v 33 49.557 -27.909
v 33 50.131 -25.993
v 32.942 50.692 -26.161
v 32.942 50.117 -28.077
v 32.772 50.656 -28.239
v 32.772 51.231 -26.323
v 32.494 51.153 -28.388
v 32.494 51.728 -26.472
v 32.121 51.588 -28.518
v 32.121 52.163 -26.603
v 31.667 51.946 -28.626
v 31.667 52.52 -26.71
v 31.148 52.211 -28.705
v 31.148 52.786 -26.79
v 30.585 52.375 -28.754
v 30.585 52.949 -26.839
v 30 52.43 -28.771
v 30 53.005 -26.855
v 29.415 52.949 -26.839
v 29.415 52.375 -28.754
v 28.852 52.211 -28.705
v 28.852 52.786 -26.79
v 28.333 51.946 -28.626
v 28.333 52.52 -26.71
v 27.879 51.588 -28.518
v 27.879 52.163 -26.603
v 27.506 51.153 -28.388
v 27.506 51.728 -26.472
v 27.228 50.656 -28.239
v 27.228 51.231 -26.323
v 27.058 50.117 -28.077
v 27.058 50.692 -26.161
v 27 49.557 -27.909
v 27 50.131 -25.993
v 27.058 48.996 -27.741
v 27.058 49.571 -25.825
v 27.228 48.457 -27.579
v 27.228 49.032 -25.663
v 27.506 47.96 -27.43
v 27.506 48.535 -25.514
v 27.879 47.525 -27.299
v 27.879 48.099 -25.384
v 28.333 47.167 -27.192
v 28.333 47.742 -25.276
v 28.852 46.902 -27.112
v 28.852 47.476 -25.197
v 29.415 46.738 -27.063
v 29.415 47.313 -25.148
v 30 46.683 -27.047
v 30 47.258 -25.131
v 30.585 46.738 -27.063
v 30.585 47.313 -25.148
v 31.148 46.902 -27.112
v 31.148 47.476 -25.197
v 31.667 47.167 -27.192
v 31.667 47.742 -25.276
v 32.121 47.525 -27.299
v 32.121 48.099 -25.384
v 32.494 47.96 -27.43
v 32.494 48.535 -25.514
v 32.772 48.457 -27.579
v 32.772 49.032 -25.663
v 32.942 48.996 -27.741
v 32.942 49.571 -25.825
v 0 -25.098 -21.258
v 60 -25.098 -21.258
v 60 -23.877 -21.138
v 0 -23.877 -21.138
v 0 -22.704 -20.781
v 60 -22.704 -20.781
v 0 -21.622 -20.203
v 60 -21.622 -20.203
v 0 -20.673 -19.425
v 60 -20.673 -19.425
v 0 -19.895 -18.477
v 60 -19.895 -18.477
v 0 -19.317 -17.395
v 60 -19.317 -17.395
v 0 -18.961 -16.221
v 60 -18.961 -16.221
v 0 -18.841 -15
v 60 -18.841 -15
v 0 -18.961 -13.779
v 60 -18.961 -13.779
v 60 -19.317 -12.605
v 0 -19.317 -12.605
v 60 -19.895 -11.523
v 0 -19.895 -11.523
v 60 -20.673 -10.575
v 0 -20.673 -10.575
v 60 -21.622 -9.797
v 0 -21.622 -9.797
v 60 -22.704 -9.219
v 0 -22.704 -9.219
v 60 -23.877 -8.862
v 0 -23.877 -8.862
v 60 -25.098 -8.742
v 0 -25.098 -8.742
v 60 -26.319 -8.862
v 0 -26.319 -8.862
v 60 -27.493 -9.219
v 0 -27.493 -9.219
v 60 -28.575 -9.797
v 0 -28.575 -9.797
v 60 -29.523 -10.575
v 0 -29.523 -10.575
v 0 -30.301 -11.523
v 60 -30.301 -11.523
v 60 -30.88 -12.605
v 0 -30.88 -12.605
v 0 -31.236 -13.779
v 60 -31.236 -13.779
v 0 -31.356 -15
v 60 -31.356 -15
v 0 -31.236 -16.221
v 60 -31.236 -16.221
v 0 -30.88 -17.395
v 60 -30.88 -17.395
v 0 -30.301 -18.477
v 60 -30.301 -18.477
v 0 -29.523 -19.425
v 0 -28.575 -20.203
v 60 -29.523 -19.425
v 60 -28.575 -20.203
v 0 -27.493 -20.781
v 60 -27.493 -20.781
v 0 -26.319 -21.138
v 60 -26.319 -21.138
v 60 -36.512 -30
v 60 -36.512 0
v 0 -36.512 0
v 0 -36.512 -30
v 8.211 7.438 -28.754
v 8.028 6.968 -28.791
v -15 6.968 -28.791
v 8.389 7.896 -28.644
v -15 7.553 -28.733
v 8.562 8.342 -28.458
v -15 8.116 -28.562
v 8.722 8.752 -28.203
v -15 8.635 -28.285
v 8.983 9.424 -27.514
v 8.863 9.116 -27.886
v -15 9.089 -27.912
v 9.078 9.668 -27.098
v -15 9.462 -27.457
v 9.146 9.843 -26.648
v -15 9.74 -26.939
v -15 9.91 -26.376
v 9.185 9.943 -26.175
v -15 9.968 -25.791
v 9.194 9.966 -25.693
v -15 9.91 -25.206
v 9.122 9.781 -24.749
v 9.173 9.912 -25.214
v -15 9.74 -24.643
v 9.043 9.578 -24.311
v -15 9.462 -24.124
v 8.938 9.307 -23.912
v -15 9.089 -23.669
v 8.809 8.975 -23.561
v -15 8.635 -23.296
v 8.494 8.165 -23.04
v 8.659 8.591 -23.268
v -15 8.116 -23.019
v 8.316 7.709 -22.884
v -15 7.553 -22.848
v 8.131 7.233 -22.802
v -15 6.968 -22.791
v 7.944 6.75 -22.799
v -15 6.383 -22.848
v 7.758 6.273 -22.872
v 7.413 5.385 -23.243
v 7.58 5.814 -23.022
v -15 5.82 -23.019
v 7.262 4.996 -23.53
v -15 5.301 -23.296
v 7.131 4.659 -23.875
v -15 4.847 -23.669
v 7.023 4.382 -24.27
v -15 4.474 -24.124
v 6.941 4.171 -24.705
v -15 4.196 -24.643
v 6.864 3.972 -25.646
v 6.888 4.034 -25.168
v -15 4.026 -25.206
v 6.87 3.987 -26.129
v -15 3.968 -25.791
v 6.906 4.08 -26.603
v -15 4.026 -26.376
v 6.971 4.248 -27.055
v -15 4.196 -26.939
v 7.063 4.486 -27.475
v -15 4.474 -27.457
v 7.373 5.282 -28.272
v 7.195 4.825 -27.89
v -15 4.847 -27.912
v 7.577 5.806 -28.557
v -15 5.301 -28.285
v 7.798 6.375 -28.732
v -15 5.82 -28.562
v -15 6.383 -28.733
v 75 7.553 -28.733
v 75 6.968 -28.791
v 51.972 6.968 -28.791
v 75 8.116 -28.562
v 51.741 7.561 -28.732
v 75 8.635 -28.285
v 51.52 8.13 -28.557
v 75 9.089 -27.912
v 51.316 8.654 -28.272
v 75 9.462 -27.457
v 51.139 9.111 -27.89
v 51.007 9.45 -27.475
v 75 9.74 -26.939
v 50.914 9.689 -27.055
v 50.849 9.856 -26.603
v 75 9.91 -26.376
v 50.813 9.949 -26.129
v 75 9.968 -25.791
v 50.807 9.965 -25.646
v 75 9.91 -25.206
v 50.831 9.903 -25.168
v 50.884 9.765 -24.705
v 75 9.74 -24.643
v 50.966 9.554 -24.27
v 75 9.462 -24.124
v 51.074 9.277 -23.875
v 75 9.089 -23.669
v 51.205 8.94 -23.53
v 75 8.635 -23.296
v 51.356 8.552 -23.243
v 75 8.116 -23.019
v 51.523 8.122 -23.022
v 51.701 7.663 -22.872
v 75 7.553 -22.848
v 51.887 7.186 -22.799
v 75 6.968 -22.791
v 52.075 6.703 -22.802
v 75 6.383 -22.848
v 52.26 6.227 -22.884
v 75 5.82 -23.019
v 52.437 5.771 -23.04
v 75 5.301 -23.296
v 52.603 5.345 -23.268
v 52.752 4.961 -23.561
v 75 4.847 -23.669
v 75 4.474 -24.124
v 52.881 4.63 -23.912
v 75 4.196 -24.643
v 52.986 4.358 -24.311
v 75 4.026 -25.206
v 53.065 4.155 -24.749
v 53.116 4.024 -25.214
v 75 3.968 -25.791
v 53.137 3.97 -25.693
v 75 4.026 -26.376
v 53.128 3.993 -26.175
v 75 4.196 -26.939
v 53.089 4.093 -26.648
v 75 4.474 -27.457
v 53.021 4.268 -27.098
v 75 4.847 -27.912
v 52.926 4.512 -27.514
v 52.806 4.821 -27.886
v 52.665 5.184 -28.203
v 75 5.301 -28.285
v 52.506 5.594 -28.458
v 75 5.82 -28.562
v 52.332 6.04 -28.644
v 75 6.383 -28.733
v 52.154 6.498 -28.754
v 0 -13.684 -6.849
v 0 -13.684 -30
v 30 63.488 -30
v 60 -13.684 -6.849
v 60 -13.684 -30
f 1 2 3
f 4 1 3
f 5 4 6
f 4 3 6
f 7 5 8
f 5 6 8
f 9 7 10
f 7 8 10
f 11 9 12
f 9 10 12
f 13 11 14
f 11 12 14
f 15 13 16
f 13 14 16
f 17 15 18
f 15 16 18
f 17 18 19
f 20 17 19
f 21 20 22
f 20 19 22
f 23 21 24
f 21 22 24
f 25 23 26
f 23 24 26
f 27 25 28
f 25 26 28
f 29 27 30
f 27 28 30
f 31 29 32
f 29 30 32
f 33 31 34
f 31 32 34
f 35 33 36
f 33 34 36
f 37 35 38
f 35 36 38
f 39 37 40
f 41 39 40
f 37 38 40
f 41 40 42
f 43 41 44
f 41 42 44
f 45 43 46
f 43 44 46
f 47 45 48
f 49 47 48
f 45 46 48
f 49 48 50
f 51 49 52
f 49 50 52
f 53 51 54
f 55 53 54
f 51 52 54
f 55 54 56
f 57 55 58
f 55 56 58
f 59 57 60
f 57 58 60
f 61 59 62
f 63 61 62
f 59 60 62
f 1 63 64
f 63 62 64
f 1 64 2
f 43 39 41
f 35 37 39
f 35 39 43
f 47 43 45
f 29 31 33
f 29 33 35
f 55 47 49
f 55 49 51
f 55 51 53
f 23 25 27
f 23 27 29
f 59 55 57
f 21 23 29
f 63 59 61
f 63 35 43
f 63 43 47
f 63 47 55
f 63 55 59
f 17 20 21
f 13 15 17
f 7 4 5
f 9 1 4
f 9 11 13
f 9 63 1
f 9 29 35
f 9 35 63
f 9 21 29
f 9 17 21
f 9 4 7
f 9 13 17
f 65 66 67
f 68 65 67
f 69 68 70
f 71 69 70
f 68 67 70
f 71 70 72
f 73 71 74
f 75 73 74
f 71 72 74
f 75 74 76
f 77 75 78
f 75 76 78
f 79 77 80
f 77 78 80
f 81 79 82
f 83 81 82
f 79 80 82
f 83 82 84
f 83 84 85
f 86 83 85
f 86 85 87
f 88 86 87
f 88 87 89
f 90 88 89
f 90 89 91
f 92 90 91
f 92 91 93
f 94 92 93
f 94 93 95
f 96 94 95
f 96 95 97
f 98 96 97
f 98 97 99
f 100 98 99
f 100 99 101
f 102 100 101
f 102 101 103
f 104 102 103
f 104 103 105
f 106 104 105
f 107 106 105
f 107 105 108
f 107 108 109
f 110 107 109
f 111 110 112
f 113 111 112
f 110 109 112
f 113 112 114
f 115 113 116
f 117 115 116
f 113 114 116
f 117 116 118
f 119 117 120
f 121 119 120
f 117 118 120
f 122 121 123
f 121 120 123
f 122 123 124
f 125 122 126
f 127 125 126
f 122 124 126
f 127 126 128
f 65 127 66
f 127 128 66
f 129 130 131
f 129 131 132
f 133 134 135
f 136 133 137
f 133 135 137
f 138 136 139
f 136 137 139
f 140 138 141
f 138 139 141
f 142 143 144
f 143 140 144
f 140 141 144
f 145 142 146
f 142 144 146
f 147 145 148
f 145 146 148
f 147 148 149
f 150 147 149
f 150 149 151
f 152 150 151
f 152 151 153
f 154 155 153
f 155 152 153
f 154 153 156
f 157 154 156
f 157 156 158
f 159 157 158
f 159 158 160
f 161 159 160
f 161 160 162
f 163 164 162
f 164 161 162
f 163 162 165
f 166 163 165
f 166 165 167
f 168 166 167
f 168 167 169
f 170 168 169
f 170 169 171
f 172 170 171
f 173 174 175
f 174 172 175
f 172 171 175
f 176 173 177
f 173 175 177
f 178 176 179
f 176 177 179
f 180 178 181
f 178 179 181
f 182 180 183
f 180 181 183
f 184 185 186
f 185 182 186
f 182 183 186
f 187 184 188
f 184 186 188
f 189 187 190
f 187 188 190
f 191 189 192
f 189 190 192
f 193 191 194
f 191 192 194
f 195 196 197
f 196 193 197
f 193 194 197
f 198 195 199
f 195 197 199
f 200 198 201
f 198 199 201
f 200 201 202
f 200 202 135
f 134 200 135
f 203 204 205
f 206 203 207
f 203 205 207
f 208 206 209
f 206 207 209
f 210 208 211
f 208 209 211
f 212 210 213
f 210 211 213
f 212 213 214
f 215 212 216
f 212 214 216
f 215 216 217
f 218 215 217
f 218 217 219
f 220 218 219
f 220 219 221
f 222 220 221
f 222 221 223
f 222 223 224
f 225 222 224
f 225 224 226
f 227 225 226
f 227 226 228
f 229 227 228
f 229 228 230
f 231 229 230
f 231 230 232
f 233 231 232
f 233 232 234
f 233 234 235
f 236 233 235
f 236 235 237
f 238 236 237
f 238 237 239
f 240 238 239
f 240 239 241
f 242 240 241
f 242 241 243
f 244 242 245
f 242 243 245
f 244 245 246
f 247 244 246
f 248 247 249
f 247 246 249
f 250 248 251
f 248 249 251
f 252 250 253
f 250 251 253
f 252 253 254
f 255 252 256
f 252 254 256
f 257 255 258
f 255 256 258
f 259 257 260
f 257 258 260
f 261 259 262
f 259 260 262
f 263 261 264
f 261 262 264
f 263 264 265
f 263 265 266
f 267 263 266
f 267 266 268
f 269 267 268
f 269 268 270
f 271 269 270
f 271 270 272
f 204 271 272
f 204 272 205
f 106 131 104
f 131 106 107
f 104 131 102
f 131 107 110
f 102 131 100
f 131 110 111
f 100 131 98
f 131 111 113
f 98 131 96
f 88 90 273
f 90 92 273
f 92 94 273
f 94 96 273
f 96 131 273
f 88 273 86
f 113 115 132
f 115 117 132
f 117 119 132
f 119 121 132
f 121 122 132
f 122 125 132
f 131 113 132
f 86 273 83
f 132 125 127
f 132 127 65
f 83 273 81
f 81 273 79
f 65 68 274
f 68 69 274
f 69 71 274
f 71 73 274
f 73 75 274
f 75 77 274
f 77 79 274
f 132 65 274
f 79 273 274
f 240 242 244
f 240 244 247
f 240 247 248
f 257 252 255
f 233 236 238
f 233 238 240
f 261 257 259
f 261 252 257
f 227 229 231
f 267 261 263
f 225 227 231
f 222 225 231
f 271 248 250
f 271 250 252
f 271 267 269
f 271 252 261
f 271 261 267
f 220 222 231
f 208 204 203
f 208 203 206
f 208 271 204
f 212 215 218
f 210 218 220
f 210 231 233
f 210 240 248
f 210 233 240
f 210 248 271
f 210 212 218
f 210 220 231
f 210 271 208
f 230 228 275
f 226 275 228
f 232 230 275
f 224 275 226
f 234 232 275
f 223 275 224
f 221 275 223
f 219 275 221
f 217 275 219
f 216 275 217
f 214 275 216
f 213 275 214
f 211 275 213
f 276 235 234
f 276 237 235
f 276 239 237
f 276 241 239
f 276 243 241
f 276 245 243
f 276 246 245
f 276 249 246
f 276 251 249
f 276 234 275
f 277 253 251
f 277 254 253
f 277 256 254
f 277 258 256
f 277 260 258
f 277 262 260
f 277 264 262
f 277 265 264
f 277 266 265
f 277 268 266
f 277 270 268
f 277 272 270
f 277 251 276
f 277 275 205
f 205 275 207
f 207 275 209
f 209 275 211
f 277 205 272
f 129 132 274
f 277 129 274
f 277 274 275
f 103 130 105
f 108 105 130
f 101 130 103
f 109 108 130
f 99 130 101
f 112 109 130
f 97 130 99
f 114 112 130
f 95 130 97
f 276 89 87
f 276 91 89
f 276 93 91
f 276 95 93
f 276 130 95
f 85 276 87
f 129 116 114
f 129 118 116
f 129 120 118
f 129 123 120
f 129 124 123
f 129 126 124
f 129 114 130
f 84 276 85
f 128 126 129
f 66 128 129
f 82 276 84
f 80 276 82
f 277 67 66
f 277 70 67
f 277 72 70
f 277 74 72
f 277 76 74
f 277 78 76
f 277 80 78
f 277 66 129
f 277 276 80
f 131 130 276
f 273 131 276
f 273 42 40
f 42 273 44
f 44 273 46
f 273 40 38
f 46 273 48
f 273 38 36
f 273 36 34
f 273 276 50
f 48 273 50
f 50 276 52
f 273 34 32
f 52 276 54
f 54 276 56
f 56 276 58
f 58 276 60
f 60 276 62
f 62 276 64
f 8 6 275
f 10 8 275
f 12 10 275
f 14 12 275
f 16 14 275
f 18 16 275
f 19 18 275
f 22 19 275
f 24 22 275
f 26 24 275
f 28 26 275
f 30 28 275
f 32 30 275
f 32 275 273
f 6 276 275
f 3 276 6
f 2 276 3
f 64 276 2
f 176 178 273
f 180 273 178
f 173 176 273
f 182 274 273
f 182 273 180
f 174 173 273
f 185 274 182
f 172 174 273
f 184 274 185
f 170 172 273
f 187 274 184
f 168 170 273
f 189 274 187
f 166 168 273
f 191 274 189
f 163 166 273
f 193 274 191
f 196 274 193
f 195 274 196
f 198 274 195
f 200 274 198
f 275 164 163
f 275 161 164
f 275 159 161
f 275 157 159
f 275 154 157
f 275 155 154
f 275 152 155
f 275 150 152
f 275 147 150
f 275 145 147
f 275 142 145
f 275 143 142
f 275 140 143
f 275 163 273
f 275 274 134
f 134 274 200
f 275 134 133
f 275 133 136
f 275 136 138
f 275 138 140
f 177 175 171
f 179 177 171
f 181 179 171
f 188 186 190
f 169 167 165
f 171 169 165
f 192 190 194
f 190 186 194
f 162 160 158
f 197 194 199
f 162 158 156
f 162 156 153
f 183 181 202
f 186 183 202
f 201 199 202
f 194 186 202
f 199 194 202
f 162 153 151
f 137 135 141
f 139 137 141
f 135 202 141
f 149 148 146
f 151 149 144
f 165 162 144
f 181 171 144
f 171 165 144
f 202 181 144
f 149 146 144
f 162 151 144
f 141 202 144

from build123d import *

# Parameters (mm, degrees)
SKETCH2_W           = 30
SKETCH2_H           = 100
EXTRUDE_THIN1_DEPTH = 60
CUT_EXTRUDE1_DEPTH  = 60
CUT_EXTRUDE2_DEPTH  = 60
CUT_EXTRUDE3_DEPTH  = 60
SKETCH6_R           = 6.257784416
CUT_EXTRUDE4_DEPTH  = 61
SKETCH7_R           = 3
CUT_EXTRUDE5_DEPTH  = 2
BOSS_EXTRUDE1_START = -75
SKETCH10_R          = 3
BOSS_EXTRUDE1_DEPTH = 90


with BuildPart() as part:
    # Sketch2 → Extrude-Thin1 (new body)
    with BuildSketch(Plane(origin=(0, 0, 0), x_dir=(0, 0, -1), z_dir=(1, 0, 0))):
        with Locations((15, 13.4875)):
            Rectangle(SKETCH2_W, SKETCH2_H)
    extrude(amount=EXTRUDE_THIN1_DEPTH)

    # Sketch3 → Cut-Extrude1 (cut)
    with BuildSketch(Plane(origin=(60, 0, 0), x_dir=(0, 0, -1), z_dir=(1, 0, 0))):
        Polygon((0, 63.4875), (0, -36.5125), (30, 63.4875), align=None)
    extrude(amount=-CUT_EXTRUDE1_DEPTH, mode=Mode.SUBTRACT)

    # Sketch4 → Cut-Extrude2 (cut)
    with BuildSketch(Plane(origin=(0, 0, -30), x_dir=(-1, 0, 0), z_dir=(0, 0, -1))):
        Polygon((-30, 63.4875), (-60, -13.684128909), (-60, 63.4875), align=None)
    extrude(amount=-CUT_EXTRUDE2_DEPTH, mode=Mode.SUBTRACT)

    # Sketch5 → Cut-Extrude3 (cut)
    with BuildSketch(Plane(origin=(0, 0, -30), x_dir=(-1, 0, 0), z_dir=(0, 0, -1))):
        Polygon((-30, 63.4875), (0, 63.4875), (0, -13.684128909), align=None)
    extrude(amount=-CUT_EXTRUDE3_DEPTH, mode=Mode.SUBTRACT)

    # Sketch6 → Cut-Extrude4 (cut, through all)
    with BuildSketch(Plane(origin=(60, 0, 0), x_dir=(0, 0, -1), z_dir=(1, 0, 0))):
        with Locations((15, -25.098314454)):
            Circle(SKETCH6_R)
    extrude(amount=-CUT_EXTRUDE4_DEPTH, mode=Mode.SUBTRACT)

    # Sketch7 → Cut-Extrude5 (cut)
    with BuildSketch(Plane(origin=(0, -3.014793578, -10.049311927), x_dir=(1, 0, 0), z_dir=(0, 0.287347886, 0.957826285))):
        with Locations((30, 55.48605385)):
            Circle(SKETCH7_R)
    extrude(amount=-CUT_EXTRUDE5_DEPTH, mode=Mode.SUBTRACT)

    # Sketch10 → Boss-Extrude1 (add)
    with BuildSketch(Plane(origin=(60, 0, 0), x_dir=(0, 0, -1), z_dir=(1, 0, 0)).offset(BOSS_EXTRUDE1_START)):
        with Locations((25.790784961, 6.968067419)):
            Circle(SKETCH10_R)
    extrude(amount=BOSS_EXTRUDE1_DEPTH)


solid = part.part
